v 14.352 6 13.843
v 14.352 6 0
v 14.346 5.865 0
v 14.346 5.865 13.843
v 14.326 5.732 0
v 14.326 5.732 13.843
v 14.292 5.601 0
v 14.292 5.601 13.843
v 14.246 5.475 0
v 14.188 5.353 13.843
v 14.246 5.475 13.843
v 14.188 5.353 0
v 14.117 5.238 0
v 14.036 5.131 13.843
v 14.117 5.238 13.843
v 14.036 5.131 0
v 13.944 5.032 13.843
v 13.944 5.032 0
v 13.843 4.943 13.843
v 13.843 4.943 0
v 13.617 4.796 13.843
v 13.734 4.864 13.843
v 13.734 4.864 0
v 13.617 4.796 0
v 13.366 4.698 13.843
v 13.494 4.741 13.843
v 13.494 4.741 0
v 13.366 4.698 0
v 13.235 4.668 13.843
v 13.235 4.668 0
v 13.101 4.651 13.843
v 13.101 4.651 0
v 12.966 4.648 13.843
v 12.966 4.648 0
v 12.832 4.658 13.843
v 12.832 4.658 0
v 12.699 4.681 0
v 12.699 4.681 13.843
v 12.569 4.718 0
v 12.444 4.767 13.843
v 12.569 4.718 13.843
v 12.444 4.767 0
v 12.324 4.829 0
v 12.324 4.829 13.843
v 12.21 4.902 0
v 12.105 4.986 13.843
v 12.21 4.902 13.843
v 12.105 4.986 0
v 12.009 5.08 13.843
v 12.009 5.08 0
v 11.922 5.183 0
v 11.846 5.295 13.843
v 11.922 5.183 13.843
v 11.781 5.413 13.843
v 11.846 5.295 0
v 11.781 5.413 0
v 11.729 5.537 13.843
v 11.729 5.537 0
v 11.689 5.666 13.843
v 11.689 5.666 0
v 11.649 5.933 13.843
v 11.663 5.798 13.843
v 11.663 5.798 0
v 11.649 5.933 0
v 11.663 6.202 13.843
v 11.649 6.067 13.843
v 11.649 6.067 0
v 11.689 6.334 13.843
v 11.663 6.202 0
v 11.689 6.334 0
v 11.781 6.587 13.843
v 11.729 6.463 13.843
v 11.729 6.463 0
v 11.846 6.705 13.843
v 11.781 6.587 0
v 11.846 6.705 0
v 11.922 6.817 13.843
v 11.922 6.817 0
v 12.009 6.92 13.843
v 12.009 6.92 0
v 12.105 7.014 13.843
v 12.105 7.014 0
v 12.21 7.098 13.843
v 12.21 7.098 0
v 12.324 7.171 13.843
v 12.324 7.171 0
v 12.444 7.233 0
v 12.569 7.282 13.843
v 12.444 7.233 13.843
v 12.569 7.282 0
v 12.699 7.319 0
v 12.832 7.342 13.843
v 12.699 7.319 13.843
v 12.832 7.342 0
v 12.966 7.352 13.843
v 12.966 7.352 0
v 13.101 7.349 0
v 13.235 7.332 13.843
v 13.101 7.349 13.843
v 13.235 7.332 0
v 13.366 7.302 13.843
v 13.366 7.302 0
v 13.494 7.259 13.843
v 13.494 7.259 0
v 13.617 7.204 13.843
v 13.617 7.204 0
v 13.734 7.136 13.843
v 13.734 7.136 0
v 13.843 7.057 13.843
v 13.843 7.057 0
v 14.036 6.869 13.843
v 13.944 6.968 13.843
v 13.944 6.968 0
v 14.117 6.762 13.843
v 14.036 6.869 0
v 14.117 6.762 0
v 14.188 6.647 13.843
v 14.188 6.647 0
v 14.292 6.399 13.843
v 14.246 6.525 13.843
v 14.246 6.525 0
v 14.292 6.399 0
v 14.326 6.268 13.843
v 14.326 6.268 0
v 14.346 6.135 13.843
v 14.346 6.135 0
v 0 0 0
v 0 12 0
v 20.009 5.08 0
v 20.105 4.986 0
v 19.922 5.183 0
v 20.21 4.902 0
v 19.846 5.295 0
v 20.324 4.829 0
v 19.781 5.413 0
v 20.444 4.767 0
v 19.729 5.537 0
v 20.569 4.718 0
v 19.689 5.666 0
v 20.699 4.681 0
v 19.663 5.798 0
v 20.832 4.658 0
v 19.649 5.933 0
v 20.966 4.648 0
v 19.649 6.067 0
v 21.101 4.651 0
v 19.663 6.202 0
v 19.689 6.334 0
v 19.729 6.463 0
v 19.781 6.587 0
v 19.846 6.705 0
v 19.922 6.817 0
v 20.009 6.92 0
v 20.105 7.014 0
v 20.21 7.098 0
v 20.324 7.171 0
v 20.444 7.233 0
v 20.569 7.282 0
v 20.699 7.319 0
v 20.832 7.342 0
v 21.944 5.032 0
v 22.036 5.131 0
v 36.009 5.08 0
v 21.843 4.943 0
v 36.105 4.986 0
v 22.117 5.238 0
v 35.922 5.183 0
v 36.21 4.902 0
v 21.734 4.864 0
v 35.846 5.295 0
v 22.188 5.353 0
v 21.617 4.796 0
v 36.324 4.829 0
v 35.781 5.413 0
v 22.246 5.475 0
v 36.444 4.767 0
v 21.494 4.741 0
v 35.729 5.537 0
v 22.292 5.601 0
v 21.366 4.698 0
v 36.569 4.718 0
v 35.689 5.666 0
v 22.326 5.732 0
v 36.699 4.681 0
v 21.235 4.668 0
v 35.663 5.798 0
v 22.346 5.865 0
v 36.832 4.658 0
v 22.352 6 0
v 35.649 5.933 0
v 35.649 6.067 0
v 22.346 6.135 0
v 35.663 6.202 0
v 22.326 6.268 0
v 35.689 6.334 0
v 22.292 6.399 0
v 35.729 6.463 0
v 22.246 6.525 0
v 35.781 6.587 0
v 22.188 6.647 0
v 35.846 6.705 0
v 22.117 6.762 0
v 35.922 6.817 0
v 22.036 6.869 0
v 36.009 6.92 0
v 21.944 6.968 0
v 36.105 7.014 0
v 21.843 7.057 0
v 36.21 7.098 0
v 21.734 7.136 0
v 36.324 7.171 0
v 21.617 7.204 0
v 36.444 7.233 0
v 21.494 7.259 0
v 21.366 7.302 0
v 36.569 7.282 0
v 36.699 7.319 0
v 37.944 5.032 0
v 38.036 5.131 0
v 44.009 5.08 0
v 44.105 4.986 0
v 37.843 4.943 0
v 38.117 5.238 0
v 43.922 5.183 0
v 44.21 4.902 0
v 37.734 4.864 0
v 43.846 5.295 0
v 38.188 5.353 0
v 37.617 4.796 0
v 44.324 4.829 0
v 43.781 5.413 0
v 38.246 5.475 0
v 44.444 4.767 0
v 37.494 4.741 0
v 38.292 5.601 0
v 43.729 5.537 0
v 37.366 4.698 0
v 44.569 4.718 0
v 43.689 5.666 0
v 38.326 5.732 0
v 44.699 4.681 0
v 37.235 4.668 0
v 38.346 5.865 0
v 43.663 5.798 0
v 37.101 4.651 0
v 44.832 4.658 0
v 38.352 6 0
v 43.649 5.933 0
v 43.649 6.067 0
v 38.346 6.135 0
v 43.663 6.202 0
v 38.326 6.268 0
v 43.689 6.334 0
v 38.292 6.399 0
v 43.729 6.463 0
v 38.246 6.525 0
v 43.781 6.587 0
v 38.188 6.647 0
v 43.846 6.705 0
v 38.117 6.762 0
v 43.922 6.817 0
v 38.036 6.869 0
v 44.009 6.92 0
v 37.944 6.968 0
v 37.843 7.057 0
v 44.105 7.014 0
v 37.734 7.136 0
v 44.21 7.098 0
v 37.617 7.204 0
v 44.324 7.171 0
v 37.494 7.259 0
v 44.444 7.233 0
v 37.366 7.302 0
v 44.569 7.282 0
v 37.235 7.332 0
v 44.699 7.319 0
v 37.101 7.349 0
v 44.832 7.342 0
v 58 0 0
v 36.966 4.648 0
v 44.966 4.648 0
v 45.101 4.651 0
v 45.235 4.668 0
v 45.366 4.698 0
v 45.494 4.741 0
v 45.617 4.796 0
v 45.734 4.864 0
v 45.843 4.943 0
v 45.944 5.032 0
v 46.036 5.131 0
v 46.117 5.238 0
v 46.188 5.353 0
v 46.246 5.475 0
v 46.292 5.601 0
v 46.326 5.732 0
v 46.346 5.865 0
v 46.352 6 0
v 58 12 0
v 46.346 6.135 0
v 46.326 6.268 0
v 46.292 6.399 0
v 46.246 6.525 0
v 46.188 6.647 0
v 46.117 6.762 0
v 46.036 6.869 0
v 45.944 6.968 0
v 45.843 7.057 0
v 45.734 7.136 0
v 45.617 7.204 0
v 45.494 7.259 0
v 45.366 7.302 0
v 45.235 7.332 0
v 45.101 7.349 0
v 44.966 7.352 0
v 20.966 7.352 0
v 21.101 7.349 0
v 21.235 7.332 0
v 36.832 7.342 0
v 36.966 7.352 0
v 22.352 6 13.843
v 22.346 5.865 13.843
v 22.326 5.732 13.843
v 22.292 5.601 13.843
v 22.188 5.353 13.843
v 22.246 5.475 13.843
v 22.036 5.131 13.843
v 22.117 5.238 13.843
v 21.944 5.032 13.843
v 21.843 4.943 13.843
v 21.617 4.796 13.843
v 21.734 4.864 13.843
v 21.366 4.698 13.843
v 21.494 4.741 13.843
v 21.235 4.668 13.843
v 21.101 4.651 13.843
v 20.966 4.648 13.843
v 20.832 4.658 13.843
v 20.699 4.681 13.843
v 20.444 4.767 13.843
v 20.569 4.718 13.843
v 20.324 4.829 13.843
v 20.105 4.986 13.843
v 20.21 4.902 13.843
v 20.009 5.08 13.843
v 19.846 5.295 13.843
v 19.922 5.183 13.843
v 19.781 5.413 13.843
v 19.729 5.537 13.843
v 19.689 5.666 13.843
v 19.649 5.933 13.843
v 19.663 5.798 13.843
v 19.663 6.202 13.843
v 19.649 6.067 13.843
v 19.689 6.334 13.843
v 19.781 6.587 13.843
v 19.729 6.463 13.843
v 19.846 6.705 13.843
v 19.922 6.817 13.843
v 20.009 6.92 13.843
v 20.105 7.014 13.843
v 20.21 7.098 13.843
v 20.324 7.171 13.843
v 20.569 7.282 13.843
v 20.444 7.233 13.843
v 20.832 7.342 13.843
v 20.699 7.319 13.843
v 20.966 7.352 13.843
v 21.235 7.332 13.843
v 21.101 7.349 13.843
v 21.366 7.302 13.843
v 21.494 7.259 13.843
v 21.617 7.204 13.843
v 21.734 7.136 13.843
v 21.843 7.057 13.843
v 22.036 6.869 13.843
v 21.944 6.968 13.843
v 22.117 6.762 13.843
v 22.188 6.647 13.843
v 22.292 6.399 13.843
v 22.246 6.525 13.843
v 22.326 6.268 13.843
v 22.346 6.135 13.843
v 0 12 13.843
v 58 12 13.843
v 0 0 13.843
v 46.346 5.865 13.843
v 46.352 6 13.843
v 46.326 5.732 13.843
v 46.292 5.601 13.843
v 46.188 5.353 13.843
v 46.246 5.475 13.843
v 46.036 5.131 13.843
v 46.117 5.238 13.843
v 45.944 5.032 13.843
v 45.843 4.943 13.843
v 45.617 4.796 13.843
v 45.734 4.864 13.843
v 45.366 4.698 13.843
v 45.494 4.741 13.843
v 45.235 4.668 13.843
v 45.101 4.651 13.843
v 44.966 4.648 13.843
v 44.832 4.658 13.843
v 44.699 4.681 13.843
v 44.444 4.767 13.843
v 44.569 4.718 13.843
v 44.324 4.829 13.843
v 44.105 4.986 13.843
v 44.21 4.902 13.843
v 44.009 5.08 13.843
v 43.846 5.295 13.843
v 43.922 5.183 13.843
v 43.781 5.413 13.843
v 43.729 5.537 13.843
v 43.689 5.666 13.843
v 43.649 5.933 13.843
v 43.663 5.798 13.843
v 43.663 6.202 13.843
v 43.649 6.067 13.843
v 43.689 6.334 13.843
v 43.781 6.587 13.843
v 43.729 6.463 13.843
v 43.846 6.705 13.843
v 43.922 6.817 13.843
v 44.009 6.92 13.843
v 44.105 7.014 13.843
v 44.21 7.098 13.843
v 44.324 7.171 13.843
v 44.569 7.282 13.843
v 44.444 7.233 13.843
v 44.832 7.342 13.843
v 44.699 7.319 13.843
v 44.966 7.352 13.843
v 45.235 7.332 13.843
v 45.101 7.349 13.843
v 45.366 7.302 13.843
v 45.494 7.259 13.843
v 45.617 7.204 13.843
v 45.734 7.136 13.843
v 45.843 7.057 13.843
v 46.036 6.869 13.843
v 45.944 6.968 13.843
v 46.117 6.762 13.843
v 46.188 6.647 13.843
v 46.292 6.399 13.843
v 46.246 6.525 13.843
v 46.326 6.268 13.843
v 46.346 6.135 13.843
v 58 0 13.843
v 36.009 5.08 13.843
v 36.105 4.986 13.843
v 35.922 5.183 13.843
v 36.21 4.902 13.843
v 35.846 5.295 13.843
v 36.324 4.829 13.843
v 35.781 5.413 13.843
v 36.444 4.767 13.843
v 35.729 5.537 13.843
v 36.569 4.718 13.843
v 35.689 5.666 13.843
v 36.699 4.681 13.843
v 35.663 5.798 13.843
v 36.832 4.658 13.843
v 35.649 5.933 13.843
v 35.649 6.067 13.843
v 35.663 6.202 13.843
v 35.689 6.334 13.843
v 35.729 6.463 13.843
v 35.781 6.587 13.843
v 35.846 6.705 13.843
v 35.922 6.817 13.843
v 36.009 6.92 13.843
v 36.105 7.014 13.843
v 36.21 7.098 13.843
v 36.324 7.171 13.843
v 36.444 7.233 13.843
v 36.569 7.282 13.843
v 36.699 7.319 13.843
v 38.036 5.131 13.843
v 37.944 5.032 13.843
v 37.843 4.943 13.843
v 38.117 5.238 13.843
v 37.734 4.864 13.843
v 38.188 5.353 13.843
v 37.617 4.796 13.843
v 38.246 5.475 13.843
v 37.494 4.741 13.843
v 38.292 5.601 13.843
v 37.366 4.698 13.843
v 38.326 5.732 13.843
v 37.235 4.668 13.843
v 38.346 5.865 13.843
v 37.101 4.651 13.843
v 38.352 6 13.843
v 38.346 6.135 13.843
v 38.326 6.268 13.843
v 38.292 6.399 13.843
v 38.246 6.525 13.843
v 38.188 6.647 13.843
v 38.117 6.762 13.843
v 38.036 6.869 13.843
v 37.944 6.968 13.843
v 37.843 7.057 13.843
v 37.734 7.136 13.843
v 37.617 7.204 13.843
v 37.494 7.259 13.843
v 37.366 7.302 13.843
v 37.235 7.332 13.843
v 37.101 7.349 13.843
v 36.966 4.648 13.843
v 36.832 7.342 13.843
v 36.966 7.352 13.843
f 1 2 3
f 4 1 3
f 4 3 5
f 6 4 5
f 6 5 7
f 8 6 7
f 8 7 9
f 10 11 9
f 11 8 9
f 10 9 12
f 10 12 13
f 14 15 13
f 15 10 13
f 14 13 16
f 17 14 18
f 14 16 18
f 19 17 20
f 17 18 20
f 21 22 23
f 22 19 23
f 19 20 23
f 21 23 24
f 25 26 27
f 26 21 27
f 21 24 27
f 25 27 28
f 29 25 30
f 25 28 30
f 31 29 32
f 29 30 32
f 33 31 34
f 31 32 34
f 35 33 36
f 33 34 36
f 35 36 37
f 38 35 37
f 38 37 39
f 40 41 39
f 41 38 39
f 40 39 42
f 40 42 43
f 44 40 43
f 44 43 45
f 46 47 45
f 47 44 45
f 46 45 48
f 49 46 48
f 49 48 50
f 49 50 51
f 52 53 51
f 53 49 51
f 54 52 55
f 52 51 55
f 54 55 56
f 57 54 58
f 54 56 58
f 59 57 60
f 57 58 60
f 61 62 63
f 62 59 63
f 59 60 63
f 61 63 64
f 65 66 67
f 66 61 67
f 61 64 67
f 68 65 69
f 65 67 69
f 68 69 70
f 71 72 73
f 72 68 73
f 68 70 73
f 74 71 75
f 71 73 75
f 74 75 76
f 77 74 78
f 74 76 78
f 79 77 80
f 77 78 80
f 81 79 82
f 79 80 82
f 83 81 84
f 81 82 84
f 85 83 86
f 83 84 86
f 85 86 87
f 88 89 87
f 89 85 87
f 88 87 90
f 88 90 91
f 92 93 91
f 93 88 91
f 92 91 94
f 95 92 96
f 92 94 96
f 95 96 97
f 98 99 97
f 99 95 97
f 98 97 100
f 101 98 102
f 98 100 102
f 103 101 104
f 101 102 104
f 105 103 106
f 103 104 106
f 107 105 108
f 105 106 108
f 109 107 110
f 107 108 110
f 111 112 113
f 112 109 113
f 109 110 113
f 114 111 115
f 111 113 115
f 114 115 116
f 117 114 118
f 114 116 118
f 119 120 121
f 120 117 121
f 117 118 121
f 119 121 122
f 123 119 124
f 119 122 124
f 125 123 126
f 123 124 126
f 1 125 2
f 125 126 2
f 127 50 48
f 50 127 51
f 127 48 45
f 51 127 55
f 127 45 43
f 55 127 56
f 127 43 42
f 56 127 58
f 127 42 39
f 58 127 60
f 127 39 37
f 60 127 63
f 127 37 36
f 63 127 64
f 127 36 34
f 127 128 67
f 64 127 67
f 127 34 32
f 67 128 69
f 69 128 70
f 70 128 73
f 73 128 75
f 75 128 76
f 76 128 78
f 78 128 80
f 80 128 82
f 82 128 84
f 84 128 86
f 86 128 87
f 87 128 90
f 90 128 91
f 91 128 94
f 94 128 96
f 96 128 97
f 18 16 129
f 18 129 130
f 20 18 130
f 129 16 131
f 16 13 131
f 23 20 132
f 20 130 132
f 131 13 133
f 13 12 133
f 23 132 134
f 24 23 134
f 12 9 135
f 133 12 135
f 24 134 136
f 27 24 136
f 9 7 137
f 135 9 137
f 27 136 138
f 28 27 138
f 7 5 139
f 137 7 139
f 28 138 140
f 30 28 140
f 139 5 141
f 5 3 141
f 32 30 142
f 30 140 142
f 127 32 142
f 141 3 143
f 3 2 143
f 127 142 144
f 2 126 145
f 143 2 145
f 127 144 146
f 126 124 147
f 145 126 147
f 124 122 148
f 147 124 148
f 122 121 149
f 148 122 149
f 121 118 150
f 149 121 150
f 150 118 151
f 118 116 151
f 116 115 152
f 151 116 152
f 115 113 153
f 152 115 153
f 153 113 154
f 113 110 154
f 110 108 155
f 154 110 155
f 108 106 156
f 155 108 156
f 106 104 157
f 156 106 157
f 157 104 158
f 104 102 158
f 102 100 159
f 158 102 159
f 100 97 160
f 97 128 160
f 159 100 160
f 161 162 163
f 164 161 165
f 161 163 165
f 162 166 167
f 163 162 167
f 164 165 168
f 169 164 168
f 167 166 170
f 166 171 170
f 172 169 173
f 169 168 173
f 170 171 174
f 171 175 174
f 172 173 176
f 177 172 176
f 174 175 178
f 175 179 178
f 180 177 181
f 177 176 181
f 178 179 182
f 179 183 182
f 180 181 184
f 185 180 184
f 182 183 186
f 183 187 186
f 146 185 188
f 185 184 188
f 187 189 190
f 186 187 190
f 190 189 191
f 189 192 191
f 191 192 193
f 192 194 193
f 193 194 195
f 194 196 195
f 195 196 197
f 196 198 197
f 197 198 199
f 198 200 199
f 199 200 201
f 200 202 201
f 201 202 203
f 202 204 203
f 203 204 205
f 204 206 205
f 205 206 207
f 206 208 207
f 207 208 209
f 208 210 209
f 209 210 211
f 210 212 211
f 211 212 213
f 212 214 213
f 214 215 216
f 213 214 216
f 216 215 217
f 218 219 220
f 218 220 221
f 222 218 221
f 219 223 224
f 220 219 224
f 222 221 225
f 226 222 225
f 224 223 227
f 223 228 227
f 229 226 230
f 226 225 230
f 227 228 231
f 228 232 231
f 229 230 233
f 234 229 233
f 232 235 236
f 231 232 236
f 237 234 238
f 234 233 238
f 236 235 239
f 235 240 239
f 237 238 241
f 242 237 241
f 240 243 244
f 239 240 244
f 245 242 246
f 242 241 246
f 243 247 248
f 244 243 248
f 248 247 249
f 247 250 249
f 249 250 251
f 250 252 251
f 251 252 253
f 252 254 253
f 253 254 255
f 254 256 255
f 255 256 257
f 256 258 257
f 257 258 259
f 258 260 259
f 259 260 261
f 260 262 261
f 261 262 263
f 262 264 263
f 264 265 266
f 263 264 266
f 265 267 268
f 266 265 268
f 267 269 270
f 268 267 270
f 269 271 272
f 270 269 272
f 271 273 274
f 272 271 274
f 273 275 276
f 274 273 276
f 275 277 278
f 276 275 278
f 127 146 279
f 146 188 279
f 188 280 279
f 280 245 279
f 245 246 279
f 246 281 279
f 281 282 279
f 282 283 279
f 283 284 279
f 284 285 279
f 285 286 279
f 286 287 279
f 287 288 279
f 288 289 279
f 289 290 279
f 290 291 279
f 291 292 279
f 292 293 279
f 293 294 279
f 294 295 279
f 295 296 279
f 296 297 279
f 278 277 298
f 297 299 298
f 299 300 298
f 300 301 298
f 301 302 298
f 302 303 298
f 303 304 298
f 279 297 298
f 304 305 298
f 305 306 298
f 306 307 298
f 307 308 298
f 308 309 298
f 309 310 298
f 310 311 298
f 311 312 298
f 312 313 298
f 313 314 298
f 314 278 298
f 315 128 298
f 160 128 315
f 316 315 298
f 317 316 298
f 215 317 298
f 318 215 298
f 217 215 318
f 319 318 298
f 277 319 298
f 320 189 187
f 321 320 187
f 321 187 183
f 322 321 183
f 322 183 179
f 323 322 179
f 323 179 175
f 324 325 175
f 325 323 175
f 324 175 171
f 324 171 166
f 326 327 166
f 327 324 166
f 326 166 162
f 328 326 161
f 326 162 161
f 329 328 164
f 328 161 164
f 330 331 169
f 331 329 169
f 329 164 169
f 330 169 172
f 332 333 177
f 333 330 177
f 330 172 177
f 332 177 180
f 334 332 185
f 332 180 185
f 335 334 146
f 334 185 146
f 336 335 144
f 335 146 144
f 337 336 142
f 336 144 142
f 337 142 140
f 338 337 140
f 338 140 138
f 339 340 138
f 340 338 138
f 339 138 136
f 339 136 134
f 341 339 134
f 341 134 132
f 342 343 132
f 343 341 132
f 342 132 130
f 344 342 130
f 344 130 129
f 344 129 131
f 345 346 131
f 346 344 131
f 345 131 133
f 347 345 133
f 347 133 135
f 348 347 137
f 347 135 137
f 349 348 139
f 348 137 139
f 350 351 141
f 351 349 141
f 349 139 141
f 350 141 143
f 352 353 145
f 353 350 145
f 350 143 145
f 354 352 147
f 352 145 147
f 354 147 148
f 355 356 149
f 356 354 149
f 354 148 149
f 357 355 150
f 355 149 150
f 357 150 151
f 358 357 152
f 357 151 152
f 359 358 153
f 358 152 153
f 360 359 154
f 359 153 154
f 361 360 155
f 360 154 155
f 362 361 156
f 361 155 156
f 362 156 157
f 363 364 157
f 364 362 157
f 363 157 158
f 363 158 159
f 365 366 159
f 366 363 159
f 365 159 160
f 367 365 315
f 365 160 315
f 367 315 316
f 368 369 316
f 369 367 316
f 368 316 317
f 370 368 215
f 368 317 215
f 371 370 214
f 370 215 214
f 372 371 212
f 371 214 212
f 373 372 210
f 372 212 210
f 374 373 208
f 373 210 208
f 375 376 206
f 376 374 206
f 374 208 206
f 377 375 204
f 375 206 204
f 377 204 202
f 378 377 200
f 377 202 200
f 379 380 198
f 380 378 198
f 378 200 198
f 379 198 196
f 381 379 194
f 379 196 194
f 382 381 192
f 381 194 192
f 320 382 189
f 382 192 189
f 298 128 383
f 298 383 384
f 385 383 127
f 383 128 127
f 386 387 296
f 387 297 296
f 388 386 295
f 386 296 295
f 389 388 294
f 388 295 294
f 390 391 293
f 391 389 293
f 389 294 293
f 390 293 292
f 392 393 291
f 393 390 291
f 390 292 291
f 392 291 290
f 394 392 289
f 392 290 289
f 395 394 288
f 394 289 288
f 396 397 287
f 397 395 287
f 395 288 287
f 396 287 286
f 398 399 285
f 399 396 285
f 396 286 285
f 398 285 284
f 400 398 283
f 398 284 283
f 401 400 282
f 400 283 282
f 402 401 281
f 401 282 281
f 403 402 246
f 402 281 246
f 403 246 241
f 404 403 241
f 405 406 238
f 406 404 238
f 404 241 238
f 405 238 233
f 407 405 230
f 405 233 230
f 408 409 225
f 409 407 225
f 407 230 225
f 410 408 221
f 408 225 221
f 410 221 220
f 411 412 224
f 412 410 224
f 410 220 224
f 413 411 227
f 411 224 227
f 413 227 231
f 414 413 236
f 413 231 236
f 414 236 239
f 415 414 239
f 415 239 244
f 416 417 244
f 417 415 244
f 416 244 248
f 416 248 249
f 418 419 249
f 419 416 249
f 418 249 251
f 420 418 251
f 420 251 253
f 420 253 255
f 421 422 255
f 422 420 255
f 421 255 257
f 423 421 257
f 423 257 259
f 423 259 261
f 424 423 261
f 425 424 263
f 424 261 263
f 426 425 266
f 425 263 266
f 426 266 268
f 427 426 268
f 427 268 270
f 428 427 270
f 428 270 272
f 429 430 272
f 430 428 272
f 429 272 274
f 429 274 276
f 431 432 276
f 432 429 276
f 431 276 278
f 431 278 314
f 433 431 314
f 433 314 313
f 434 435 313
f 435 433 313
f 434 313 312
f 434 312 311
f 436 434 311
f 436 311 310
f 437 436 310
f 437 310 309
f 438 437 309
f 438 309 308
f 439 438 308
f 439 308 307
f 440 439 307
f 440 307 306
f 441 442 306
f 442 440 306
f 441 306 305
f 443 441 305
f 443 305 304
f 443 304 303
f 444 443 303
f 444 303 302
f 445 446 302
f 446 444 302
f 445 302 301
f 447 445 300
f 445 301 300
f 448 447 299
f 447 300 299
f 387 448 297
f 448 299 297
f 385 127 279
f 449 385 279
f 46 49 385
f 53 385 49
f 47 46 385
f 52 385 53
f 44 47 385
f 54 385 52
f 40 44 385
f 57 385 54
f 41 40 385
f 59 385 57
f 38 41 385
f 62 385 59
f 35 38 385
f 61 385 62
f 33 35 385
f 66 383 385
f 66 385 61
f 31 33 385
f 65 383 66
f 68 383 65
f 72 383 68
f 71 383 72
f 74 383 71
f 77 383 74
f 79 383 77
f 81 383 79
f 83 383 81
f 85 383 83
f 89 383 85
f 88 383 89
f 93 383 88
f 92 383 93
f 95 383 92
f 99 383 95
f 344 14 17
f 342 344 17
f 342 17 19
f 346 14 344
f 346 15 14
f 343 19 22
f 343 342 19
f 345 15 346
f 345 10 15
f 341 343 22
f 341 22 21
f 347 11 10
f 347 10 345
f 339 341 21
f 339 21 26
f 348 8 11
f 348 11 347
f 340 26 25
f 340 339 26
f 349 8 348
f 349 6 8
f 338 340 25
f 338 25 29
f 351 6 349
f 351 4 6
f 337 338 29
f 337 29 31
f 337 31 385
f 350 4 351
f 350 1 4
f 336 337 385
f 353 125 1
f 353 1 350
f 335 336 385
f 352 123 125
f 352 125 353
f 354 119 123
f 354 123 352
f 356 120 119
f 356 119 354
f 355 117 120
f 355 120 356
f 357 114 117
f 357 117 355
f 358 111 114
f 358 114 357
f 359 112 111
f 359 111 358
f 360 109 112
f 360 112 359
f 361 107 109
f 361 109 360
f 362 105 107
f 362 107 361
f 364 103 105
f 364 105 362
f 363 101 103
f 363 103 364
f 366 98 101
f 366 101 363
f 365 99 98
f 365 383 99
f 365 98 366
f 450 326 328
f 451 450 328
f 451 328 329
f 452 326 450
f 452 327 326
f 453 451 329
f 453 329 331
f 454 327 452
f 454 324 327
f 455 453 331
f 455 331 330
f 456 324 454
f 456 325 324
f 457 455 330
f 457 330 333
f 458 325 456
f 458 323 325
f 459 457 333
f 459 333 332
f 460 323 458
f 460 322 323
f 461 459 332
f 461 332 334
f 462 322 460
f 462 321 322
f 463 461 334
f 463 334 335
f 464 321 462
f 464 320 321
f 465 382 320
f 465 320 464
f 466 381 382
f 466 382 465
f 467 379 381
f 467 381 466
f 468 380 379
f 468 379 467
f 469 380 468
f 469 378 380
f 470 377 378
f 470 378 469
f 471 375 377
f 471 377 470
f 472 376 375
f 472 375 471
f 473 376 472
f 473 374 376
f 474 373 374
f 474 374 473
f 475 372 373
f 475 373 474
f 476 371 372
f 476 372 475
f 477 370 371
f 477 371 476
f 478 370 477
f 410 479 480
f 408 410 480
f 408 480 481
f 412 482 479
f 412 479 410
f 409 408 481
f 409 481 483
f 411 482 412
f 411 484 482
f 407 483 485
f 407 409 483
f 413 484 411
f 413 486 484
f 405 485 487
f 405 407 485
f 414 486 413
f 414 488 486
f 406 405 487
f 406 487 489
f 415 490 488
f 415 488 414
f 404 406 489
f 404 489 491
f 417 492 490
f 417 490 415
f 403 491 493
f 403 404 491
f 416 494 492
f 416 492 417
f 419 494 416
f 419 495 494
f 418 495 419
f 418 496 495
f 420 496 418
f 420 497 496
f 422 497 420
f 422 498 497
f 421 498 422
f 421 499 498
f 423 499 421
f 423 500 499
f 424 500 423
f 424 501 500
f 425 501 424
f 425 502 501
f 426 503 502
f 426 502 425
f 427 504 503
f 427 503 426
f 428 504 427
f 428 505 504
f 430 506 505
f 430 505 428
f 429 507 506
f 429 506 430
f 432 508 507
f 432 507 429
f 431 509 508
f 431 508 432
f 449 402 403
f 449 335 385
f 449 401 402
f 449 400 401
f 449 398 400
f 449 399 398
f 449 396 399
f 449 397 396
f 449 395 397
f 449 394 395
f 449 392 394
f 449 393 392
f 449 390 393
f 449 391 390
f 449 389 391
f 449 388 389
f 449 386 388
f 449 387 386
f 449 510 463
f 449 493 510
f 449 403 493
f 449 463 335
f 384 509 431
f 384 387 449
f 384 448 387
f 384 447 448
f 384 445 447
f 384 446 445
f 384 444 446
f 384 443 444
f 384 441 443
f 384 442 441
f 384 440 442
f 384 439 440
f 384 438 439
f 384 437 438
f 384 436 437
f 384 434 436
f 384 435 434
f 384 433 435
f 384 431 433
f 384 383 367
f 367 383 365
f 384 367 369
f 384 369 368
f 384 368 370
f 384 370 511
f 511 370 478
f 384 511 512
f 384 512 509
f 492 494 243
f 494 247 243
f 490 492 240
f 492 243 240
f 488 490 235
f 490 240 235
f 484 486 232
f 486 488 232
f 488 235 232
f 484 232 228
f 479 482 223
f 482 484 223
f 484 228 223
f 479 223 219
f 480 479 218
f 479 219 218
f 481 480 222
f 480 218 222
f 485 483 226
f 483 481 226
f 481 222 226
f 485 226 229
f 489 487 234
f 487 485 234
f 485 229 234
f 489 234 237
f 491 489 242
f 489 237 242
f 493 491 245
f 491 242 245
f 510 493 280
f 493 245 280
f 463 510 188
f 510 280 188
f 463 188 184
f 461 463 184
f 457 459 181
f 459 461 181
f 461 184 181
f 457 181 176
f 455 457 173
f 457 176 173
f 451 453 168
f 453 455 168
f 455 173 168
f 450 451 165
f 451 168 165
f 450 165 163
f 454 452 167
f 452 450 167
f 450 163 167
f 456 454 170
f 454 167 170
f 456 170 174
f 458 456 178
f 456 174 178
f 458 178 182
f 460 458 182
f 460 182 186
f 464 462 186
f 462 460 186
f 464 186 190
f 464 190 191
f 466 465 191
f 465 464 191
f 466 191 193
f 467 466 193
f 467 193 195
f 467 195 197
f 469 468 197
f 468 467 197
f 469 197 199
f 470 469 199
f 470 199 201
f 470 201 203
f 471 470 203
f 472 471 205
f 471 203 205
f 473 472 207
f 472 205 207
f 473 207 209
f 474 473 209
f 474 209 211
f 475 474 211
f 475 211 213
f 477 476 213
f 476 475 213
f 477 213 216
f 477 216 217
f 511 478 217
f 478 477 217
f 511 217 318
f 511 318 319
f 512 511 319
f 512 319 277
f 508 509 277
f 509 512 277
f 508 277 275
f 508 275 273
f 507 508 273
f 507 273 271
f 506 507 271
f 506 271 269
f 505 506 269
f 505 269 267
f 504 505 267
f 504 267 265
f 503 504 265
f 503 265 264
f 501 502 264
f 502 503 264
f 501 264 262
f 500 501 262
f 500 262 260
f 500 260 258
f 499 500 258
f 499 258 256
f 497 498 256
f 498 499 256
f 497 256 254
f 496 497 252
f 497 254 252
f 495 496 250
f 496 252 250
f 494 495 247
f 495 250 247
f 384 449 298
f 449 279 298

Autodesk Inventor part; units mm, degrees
ref_plane "YZ Plane" through (0, 0, 0) normal (1, 0, 0) x (0, 1, 0)
ref_plane "XZ Plane" through (0, 0, 0) normal (0, 1, 0) x (-1, 0, 0)
ref_plane "XY Plane" through (0, 0, 0) normal (0, 0, 1) x (1, 0, 0)
sketch "Sketch1" plane through (0, 0, 0) normal (0, 0, 1) x (1, 0, 0)
  circle A0 centre (13, 6) radius 1.3525
  circle A1 centre (21, 6) radius 1.3525
  circle A2 centre (37, 6) radius 1.3525
  circle A3 centre (45, 6) radius 1.3525
  line L0 (0, 0) -> (58, 0)
  line L1 (58, 0) -> (58, 12)
  line L2 (0, 12) -> (58, 12)
  line L3 (0, 12) -> (0, 0)
  point P0 (29, 6)
extrude "Extrusion1" add sketch "Sketch1" along normal blind 13.843
properties part number "Motor Spacer"
